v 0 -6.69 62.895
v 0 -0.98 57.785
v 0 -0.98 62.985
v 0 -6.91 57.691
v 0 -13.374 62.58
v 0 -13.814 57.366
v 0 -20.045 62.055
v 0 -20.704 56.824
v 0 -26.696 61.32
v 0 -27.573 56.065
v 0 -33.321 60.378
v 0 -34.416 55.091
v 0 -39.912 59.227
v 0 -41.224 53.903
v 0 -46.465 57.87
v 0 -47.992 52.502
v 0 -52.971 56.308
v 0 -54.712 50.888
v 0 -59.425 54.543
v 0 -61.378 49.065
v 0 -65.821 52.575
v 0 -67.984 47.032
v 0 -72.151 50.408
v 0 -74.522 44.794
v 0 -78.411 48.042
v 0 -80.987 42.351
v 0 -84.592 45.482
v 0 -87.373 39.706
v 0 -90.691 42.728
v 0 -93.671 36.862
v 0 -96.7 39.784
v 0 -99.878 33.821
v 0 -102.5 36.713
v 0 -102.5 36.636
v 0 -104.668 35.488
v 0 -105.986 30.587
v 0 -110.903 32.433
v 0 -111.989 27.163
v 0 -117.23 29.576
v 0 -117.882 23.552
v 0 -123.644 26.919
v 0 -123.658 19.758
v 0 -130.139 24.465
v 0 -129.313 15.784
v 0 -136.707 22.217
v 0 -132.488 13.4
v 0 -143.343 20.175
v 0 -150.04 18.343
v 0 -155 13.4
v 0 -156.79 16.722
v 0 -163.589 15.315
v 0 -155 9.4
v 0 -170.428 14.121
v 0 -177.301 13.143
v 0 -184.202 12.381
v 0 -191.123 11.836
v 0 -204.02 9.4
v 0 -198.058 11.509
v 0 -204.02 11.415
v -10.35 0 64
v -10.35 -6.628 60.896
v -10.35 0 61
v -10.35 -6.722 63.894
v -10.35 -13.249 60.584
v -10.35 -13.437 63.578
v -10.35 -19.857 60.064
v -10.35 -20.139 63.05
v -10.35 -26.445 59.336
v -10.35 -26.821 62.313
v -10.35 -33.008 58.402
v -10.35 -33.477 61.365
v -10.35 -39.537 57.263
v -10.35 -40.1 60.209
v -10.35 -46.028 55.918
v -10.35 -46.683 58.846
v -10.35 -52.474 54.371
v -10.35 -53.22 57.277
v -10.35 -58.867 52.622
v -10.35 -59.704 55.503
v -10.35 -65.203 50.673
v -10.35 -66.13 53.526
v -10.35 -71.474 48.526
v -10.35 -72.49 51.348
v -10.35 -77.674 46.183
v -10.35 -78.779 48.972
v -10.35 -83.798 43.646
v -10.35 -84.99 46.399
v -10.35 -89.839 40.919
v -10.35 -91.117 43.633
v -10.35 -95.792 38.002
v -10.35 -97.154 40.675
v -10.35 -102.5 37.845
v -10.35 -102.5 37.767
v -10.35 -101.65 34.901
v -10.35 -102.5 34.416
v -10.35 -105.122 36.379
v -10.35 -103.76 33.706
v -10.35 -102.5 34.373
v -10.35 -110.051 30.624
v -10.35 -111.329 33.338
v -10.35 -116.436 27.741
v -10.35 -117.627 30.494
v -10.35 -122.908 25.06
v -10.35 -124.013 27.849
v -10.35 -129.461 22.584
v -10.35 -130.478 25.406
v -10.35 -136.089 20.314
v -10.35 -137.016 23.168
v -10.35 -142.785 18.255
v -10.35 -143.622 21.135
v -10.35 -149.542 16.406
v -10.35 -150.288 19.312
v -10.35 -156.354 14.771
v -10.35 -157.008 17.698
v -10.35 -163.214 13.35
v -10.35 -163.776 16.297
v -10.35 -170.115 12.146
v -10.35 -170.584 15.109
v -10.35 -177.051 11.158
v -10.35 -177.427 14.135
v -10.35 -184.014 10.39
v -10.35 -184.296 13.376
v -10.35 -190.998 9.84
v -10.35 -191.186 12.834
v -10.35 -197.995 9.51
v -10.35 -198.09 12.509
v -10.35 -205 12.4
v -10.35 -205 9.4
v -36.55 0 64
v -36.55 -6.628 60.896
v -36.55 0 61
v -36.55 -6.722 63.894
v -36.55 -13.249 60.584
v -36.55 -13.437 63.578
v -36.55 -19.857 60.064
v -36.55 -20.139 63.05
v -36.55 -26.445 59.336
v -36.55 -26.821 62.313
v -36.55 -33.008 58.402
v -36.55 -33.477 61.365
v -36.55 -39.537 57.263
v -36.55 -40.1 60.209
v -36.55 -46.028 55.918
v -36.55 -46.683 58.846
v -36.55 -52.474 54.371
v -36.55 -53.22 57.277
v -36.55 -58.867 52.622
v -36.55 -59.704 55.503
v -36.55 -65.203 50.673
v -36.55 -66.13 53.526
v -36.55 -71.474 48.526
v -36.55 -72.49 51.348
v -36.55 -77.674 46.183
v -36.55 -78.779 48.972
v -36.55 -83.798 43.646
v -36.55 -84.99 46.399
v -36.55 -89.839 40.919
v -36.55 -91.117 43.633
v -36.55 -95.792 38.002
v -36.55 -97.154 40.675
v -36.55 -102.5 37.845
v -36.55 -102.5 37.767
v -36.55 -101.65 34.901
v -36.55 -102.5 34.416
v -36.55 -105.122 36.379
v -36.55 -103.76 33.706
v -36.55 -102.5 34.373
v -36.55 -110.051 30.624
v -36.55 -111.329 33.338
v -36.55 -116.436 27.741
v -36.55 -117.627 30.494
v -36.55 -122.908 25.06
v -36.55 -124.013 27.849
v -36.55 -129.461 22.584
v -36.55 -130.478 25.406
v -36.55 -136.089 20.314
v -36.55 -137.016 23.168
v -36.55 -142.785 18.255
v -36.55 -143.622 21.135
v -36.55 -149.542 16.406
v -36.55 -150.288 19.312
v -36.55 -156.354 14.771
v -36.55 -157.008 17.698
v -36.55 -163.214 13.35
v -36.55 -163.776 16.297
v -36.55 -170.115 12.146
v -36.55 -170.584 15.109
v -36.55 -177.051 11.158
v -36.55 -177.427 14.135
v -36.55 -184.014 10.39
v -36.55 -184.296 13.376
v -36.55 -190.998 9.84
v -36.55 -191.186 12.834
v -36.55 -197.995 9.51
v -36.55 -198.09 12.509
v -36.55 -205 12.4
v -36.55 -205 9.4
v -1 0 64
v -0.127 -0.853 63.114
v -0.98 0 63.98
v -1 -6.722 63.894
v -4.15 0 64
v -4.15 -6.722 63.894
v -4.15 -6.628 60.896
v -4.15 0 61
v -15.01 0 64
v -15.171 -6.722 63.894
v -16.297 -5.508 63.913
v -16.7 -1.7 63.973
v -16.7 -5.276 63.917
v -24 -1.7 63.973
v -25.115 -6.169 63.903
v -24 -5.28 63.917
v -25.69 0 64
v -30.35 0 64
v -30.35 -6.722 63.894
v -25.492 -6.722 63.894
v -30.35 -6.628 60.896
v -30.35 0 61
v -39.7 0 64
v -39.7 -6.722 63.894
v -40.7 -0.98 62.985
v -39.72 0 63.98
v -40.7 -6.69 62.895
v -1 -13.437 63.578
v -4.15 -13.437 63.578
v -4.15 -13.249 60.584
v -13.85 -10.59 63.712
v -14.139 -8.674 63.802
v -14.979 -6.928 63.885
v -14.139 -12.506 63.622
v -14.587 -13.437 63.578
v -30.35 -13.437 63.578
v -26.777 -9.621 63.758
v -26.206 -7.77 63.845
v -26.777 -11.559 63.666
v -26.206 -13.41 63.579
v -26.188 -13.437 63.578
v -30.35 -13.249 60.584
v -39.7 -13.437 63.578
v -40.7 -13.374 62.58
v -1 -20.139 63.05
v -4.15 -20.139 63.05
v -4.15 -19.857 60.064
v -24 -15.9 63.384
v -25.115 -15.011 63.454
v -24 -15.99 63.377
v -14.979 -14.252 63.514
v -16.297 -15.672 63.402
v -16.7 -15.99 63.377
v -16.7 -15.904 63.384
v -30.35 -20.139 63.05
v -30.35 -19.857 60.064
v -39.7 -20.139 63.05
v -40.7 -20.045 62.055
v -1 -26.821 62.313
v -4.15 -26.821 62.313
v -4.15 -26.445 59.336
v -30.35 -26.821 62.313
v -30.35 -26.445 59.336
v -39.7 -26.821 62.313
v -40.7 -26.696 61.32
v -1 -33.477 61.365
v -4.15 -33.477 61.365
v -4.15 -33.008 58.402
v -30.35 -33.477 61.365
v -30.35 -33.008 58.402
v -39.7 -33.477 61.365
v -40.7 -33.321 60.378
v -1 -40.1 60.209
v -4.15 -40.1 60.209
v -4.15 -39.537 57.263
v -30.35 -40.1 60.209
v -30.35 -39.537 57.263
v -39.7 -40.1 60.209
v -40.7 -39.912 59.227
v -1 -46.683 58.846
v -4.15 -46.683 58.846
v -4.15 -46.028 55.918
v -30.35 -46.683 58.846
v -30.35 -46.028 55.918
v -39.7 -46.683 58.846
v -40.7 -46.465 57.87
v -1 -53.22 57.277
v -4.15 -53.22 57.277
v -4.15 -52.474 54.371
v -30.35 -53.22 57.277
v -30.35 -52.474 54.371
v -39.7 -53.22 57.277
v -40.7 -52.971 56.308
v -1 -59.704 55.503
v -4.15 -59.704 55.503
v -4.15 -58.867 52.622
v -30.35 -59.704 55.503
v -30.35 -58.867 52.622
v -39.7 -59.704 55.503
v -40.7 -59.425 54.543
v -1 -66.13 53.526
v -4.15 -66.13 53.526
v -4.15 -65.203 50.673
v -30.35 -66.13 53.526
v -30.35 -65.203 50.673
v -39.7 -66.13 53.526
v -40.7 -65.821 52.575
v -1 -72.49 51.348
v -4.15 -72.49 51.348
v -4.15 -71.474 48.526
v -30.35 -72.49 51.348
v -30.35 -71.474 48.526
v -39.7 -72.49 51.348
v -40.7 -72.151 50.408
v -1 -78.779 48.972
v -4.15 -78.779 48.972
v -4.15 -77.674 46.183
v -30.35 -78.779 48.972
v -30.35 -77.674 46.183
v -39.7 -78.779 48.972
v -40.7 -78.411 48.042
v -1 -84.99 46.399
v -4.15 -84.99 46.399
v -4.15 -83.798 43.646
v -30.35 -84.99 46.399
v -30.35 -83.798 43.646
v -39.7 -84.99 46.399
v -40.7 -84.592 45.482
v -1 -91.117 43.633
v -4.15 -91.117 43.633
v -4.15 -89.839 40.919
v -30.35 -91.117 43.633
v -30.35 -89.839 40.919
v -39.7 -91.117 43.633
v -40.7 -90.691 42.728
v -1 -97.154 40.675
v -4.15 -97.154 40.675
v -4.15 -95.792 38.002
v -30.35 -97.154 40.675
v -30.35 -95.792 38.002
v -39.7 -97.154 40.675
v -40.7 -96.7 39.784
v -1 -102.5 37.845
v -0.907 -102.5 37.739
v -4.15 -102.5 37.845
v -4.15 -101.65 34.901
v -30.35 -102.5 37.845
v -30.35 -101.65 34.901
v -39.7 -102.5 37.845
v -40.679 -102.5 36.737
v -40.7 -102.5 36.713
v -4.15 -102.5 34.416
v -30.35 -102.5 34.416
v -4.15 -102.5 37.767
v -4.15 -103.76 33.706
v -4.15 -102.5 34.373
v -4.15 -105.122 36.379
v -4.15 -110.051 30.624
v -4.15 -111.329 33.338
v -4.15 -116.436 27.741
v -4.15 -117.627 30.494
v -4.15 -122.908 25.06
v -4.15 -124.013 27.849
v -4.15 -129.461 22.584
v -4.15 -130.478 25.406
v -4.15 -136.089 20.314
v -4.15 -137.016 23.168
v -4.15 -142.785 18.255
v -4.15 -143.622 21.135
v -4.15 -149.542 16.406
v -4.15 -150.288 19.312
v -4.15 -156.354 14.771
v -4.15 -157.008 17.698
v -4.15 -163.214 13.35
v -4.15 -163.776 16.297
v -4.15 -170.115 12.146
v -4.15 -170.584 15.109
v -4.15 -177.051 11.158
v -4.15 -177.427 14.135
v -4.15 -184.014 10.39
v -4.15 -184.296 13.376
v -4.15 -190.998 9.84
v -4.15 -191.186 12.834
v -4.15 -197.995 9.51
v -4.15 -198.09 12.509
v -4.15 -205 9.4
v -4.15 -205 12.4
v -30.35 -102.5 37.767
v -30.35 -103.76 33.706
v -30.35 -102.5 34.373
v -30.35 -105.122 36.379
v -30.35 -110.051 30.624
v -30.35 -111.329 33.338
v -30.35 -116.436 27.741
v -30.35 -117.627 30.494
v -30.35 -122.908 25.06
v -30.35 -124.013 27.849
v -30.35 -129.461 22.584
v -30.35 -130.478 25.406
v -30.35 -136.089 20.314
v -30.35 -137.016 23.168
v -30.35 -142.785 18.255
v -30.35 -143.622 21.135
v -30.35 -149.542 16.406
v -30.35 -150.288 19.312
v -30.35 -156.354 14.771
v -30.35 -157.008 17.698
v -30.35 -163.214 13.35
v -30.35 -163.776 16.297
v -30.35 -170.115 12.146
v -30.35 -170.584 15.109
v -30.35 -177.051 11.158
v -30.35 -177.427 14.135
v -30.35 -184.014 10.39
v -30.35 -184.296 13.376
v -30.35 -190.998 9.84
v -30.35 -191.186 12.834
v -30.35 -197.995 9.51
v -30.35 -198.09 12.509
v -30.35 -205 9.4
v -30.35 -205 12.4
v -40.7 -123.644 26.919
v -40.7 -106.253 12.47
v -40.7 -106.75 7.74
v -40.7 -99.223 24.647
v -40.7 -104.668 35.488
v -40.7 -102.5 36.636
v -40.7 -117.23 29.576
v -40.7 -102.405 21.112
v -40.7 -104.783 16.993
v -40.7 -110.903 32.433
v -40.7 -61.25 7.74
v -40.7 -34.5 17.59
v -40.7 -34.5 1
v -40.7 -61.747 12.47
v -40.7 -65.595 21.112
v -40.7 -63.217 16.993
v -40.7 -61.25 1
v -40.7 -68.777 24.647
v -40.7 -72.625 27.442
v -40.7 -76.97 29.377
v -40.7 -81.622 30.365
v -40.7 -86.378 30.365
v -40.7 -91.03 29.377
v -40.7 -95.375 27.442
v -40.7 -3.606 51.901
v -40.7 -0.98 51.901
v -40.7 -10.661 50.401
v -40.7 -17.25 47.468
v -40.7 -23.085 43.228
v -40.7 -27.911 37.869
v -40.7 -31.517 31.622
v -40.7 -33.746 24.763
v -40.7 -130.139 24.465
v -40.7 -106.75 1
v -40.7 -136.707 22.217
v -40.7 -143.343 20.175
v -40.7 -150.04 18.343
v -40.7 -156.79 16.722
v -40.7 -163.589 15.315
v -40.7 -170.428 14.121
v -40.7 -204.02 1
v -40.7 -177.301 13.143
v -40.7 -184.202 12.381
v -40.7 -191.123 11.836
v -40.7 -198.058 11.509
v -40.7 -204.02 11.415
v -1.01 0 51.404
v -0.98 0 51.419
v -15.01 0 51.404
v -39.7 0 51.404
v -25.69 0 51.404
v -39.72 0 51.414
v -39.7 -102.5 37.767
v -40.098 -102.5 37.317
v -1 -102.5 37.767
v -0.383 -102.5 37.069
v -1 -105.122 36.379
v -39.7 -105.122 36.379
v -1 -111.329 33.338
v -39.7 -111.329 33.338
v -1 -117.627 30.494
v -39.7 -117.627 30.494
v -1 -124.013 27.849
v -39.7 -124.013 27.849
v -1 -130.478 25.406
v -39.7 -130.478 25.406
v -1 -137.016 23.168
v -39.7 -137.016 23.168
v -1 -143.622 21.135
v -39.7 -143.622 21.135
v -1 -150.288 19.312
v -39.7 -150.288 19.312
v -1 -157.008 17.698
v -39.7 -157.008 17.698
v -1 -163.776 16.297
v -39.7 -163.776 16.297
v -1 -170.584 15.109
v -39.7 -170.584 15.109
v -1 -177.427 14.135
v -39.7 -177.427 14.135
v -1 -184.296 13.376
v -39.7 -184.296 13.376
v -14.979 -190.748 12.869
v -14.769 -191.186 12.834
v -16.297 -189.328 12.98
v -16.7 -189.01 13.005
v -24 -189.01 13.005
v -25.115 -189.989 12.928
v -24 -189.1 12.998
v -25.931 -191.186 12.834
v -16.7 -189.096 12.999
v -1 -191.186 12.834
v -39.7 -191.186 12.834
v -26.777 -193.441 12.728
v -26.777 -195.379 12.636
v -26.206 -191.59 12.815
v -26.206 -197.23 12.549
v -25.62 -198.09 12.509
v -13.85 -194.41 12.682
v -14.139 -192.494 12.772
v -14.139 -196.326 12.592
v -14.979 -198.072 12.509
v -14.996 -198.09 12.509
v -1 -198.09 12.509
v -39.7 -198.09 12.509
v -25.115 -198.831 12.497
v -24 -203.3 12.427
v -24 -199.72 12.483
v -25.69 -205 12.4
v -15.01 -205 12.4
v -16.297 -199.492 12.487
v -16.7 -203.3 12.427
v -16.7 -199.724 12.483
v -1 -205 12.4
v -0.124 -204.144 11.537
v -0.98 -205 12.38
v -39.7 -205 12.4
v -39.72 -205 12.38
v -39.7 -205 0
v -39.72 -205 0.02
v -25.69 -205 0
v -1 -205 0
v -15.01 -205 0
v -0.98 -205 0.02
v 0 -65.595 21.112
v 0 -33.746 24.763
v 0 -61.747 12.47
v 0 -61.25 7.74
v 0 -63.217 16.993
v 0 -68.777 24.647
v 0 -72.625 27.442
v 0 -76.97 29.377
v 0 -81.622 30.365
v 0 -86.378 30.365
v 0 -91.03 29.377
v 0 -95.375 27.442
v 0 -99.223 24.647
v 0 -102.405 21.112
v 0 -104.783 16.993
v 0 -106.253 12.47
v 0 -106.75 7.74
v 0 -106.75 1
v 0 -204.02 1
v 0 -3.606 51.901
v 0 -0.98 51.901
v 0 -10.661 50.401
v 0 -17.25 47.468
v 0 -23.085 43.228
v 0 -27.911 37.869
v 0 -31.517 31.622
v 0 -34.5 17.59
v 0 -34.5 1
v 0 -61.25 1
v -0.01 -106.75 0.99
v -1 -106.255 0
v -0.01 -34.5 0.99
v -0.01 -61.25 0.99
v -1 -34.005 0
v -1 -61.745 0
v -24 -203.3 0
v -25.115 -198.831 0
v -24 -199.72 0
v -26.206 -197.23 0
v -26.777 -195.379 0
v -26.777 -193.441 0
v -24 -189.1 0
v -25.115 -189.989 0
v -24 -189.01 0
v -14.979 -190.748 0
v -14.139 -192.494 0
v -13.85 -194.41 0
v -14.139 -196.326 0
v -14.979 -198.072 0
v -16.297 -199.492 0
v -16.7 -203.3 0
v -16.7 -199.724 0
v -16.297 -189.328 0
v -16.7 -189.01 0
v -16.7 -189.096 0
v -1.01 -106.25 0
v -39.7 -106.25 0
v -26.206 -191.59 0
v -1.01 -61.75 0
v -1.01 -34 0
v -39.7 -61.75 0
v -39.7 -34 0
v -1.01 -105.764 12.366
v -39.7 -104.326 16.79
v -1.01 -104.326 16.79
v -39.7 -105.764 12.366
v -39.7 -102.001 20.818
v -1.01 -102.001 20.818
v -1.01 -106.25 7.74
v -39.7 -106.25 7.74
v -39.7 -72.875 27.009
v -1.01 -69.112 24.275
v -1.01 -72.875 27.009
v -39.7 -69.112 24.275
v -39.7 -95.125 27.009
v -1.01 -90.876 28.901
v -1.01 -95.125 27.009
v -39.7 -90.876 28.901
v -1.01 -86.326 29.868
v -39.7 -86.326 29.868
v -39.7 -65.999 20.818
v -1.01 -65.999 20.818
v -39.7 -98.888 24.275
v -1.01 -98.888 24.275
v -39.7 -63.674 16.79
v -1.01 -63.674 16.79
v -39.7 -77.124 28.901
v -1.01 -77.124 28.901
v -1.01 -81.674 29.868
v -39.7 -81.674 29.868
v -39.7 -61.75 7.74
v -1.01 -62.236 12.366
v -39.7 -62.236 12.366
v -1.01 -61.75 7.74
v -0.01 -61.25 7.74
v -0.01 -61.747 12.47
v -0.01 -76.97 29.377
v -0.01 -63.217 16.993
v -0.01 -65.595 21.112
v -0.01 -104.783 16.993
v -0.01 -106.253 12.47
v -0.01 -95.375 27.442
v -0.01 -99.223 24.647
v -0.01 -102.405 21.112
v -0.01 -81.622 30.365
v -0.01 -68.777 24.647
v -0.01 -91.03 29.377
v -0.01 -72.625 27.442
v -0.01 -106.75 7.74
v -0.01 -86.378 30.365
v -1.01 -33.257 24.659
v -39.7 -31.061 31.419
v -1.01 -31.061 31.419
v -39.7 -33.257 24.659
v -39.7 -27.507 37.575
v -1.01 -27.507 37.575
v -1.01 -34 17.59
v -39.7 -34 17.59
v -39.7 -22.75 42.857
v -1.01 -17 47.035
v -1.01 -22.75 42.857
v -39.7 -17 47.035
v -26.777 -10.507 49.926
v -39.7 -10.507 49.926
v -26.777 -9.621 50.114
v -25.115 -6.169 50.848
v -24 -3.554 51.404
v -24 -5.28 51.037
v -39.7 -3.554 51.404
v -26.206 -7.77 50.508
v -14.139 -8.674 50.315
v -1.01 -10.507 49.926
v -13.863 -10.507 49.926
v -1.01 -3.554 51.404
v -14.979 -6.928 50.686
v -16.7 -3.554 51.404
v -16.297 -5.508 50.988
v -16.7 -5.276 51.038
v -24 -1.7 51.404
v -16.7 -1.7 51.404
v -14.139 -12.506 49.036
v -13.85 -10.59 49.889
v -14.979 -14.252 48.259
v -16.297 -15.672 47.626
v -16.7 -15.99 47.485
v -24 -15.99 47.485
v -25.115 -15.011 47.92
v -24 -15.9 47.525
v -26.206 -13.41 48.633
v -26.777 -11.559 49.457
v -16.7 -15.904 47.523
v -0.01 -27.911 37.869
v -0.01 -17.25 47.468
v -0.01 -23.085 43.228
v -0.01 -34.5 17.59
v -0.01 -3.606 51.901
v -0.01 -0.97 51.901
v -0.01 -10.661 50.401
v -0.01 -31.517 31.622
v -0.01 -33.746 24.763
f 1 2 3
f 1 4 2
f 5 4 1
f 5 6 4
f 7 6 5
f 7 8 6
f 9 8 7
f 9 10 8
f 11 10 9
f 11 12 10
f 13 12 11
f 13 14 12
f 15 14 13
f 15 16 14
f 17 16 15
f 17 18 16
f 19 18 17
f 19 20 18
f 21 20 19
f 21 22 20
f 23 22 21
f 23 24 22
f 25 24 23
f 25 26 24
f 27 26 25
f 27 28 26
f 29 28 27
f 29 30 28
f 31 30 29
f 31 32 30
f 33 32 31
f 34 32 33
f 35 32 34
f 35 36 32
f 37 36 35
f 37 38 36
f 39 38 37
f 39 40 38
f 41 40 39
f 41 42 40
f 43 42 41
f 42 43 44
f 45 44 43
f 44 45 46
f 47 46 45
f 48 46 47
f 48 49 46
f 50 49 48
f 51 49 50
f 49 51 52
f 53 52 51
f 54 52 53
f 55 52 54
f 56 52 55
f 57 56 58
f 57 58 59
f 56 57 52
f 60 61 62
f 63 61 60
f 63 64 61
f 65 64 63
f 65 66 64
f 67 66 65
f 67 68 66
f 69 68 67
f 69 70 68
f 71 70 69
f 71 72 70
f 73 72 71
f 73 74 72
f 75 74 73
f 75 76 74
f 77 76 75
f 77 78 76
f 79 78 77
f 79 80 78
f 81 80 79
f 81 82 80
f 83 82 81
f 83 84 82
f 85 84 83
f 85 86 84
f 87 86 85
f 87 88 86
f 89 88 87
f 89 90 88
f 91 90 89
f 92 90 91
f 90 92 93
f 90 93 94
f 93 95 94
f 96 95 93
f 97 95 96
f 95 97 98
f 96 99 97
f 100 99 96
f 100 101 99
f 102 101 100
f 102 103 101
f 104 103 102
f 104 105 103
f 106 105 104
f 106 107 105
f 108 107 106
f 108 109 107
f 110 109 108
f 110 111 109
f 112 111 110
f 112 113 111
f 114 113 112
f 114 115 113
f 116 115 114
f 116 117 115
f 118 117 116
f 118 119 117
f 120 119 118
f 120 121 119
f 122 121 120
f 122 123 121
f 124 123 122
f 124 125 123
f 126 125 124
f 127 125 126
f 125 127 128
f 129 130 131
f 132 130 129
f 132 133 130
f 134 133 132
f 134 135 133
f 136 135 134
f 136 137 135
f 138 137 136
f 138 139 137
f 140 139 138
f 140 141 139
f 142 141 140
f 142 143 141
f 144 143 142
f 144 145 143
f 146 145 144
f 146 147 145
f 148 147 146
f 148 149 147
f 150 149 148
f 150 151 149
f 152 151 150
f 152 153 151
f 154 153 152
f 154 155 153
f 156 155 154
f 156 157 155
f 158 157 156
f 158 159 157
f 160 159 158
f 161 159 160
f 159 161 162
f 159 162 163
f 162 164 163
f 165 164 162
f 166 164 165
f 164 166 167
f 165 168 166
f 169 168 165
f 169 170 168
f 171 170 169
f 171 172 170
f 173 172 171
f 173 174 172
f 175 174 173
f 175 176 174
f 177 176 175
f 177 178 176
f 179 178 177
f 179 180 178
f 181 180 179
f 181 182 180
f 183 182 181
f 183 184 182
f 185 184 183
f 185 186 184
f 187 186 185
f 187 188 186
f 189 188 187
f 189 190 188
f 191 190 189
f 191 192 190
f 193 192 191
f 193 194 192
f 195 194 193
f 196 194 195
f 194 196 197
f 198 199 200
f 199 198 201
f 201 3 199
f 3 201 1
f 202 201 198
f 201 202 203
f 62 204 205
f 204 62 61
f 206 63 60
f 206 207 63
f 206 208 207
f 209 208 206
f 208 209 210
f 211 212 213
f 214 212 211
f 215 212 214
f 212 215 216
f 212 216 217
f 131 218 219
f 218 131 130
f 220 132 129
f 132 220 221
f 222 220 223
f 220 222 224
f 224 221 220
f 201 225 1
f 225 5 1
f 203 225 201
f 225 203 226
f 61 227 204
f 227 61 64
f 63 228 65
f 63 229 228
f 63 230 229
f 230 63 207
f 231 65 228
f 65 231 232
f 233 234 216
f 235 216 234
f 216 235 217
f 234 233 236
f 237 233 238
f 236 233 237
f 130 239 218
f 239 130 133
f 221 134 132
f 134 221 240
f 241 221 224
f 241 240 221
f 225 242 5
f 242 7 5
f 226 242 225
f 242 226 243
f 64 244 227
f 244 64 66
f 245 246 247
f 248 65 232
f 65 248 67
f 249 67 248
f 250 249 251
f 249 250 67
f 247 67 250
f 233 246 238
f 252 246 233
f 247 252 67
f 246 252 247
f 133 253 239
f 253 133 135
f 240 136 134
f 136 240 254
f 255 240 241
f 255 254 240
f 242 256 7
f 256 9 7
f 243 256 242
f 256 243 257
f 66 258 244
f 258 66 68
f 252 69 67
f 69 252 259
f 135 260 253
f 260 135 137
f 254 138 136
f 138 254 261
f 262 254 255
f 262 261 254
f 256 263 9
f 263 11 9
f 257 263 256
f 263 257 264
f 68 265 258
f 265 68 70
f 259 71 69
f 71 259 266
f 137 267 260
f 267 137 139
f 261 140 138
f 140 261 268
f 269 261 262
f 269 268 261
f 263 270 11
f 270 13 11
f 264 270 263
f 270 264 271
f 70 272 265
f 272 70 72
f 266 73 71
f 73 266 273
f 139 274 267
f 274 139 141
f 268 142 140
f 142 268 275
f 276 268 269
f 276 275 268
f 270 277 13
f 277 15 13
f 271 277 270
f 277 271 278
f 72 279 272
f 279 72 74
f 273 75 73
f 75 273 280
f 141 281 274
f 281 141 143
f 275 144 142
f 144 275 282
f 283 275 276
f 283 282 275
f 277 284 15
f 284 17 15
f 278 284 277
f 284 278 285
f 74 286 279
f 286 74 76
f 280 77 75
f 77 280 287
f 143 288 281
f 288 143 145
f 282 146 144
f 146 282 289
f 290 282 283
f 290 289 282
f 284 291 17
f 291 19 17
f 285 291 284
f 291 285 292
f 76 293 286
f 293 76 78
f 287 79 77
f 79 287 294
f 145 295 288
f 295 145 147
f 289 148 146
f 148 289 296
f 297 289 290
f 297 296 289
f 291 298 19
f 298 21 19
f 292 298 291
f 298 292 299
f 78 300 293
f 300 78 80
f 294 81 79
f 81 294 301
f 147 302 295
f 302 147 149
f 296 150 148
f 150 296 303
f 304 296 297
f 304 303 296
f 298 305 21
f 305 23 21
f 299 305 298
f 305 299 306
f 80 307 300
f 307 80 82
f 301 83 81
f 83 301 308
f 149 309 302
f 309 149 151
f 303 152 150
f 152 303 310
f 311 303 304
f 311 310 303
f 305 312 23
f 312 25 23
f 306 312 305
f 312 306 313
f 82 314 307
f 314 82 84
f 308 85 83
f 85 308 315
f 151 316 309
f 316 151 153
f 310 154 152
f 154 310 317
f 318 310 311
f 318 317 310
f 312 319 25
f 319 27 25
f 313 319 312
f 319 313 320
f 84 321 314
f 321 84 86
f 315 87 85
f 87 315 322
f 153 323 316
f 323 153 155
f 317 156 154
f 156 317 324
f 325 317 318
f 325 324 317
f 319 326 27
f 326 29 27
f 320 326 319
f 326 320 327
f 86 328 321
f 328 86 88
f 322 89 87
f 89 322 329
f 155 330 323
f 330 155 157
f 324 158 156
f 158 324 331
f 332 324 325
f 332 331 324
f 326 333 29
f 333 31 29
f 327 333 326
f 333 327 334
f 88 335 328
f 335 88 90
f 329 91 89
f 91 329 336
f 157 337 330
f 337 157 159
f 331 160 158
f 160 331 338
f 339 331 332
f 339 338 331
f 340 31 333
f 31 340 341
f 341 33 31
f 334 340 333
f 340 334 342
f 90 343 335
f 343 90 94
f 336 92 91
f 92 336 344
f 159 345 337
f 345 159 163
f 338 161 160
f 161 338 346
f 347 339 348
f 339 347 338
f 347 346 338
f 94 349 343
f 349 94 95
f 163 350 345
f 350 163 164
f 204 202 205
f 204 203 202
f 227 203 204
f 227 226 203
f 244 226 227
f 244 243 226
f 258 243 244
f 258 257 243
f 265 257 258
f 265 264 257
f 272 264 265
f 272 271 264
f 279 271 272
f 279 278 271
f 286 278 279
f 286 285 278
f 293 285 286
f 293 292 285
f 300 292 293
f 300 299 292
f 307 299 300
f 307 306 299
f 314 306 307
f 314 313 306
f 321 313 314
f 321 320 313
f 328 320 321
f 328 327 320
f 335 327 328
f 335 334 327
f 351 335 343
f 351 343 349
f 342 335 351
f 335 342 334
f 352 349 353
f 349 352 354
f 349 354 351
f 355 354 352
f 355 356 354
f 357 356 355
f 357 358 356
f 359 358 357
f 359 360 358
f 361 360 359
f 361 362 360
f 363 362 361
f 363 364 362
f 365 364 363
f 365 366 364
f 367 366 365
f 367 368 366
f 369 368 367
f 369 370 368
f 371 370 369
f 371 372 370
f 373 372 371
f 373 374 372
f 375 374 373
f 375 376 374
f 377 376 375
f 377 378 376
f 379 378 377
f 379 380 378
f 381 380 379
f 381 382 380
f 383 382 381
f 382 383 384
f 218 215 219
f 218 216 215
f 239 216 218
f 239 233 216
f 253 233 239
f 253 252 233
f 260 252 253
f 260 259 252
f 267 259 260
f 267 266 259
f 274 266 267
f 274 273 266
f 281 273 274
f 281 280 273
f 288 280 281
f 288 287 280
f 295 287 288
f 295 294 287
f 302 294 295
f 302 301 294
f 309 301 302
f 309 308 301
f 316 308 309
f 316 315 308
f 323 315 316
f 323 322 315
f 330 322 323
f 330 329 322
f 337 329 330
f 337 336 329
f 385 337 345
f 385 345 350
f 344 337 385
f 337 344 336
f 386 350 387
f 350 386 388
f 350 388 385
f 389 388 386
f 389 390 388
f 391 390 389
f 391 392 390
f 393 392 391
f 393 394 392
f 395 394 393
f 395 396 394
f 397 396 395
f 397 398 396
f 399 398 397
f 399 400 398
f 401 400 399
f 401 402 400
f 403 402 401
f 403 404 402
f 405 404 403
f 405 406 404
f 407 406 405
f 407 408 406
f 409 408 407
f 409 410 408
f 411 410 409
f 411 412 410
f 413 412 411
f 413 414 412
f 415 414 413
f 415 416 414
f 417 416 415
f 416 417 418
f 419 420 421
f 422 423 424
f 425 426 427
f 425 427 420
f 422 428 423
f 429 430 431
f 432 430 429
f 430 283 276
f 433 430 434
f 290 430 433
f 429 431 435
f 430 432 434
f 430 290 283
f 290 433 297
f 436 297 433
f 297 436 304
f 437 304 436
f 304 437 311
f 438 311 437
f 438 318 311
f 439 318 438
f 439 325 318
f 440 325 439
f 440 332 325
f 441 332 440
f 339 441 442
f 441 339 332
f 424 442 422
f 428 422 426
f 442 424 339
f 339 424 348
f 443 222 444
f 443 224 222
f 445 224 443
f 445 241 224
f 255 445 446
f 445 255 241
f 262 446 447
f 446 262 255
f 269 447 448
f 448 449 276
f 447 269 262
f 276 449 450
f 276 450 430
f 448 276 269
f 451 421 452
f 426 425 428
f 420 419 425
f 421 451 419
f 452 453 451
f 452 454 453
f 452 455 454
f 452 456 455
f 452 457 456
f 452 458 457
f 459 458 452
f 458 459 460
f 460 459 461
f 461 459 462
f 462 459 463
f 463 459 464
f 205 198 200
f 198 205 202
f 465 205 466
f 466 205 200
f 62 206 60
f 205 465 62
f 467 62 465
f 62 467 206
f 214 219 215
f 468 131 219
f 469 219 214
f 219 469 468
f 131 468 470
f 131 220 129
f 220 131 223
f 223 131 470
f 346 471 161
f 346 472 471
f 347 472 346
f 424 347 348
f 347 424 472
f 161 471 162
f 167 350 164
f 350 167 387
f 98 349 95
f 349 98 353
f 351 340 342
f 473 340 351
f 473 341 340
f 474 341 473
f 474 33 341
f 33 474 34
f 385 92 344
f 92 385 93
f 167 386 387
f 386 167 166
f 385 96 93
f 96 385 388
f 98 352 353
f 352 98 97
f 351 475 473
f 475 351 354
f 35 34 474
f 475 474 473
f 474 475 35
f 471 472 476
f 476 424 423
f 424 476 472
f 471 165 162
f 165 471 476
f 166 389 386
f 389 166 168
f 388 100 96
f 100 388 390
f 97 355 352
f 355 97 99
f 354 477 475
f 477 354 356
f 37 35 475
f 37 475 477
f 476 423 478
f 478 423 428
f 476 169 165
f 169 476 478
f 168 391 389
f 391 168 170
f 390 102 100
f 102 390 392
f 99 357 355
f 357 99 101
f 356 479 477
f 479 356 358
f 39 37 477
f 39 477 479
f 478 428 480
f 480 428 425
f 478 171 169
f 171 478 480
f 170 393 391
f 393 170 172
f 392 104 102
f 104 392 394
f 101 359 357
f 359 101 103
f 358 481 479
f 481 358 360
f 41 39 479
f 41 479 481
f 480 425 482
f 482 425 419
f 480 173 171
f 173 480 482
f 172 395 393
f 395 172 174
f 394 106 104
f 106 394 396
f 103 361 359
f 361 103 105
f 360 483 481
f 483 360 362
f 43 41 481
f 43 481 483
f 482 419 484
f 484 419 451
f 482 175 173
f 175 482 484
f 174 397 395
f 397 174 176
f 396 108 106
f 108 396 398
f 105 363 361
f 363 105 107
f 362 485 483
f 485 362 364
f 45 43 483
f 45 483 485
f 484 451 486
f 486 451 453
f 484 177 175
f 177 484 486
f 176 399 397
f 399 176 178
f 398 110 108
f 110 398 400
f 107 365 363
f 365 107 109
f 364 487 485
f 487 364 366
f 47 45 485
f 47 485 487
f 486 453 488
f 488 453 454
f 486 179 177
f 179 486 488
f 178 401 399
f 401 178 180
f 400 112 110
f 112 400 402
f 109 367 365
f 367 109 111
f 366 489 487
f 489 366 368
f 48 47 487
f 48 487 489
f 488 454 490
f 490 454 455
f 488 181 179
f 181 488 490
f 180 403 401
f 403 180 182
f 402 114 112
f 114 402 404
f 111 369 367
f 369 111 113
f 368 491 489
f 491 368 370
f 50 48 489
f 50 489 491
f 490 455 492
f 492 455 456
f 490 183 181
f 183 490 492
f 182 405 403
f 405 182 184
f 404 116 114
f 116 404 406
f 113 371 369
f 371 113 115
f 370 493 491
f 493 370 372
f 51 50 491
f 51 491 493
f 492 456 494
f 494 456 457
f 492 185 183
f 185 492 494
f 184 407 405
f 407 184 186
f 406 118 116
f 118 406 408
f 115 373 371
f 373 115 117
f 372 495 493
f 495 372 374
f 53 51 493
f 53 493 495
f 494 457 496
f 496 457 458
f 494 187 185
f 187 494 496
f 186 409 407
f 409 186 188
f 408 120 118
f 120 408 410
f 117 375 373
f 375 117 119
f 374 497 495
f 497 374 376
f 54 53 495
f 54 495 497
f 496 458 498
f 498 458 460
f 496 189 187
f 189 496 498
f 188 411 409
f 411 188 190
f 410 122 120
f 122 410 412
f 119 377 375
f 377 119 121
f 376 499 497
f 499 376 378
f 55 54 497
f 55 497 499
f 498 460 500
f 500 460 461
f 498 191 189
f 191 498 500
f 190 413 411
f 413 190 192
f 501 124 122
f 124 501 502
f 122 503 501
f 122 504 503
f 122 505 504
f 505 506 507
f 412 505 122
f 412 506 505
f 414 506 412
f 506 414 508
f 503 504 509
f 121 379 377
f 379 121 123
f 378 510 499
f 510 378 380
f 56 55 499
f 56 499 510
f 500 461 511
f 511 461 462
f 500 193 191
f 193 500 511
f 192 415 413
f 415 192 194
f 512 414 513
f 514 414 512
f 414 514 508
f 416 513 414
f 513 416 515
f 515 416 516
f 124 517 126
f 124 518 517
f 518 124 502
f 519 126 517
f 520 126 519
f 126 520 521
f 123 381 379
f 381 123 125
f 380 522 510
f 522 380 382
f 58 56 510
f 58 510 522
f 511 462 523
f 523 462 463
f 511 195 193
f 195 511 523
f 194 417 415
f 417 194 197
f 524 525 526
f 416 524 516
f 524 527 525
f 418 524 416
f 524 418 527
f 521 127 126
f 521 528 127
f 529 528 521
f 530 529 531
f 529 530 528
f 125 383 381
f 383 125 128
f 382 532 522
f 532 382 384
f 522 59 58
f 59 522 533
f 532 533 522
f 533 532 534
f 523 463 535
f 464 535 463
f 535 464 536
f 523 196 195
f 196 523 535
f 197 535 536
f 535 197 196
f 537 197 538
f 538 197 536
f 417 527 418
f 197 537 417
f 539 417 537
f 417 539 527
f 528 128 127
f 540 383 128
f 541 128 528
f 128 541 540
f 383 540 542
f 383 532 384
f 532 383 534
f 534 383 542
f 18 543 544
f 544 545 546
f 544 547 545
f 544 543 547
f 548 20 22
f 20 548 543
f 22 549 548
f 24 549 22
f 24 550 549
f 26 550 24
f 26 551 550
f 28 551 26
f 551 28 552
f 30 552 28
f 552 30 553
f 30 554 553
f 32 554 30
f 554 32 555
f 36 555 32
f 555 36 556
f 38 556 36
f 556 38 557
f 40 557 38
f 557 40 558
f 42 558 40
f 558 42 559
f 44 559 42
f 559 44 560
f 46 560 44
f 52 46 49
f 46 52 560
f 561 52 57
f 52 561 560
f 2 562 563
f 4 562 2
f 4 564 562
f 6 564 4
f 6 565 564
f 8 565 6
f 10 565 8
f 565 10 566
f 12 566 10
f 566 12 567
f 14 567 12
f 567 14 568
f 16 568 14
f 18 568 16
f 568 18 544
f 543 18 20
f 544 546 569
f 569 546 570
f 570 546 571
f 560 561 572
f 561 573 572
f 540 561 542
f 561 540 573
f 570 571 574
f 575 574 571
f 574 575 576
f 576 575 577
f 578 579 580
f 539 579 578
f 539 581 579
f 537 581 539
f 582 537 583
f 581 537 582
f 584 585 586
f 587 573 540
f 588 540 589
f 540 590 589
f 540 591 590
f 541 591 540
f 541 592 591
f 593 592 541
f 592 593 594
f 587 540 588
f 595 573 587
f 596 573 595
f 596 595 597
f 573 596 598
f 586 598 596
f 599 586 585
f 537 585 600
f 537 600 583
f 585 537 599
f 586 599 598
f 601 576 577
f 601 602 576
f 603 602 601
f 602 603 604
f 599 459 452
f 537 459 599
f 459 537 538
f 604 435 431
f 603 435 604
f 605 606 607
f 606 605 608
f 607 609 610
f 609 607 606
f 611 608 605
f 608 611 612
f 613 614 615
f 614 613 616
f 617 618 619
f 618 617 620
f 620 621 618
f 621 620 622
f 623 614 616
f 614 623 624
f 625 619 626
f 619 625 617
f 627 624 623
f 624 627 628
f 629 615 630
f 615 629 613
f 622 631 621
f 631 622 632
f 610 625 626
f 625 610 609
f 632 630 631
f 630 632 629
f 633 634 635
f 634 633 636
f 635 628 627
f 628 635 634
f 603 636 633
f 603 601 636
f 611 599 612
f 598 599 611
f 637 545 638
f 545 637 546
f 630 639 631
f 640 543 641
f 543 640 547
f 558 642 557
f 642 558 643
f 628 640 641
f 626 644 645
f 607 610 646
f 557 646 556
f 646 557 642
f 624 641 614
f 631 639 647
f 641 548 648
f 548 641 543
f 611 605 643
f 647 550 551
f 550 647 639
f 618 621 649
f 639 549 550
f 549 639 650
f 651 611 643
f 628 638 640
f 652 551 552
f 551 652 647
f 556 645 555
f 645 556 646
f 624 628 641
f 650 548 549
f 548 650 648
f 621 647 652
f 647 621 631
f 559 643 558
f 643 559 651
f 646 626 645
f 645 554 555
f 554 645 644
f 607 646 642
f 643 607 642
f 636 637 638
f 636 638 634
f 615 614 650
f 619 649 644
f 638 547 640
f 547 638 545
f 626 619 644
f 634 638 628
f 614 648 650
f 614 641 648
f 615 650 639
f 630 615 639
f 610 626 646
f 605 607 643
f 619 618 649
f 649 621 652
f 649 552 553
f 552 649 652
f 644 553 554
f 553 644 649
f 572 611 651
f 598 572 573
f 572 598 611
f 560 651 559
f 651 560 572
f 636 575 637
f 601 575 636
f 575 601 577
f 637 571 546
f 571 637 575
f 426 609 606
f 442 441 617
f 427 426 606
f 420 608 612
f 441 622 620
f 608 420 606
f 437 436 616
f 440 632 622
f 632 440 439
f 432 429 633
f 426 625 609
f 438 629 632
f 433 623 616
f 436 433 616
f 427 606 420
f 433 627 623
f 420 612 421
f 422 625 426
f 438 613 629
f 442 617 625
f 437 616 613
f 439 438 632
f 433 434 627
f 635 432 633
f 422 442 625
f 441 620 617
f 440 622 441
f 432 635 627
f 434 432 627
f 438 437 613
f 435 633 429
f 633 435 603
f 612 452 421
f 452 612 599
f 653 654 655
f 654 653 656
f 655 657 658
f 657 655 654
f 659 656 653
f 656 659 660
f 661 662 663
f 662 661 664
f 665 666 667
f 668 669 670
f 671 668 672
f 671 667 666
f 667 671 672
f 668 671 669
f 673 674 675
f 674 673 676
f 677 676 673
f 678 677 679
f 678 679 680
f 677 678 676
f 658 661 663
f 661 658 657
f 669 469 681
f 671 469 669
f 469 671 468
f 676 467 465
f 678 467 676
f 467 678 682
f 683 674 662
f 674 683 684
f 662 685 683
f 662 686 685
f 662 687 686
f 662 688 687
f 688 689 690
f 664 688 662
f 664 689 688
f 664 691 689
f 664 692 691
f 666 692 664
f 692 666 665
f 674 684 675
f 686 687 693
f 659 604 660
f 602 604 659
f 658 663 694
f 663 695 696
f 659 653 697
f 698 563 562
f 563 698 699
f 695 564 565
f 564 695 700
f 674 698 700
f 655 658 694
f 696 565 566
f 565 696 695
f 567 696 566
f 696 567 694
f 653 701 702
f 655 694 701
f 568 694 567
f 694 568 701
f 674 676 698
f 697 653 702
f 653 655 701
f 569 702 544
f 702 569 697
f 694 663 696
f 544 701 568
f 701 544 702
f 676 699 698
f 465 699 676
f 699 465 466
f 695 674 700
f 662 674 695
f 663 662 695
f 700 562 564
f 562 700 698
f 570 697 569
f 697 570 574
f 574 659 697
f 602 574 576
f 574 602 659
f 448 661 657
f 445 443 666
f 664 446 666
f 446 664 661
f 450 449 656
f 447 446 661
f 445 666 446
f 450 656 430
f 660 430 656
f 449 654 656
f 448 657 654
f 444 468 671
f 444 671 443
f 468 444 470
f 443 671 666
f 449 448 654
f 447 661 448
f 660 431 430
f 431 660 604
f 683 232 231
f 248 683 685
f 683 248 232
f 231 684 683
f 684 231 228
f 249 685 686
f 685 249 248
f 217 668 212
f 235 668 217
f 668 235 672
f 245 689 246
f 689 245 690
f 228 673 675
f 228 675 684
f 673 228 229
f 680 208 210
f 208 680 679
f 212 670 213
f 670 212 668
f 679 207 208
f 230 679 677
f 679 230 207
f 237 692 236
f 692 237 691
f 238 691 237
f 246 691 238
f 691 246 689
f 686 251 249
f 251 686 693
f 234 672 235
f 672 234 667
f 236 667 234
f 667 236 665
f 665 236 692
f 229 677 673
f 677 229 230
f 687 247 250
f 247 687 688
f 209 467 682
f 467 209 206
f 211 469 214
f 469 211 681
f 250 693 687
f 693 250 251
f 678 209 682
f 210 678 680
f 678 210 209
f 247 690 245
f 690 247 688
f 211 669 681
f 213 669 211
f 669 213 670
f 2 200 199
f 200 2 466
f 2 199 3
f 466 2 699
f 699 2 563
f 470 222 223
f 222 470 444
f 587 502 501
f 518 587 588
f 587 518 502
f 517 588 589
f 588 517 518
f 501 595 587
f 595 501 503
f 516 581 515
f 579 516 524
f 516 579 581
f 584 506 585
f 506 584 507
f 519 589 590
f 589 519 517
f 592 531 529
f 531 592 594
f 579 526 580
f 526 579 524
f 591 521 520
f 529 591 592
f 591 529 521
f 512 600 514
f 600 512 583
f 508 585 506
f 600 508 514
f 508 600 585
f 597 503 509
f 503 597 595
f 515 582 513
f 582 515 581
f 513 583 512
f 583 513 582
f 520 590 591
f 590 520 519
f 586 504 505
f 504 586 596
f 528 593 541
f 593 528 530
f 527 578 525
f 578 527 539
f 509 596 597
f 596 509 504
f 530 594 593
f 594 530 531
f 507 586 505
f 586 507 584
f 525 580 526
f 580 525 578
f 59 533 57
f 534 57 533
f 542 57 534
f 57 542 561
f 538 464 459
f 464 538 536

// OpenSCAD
include <lib/brio.scad>

//brio_straight(LENGTH);
//brio_straight((3/4)*LENGTH);
//brio_straight((1/2)*LENGTH);
//brio_straight((1/4)*LENGTH);
//brio_curved(ROUND_R, 8); // inner radius, Nth part
//brio_curved(ROUND_R, 16); // inner radius, Nth part
brio_bridge();
//brio_cross(LENGTH/2);
//brio_splitter();
//brio_splitter_round();
//brio_support();
//brio_tunnel();
//brio_connector(CONN_LEN);
